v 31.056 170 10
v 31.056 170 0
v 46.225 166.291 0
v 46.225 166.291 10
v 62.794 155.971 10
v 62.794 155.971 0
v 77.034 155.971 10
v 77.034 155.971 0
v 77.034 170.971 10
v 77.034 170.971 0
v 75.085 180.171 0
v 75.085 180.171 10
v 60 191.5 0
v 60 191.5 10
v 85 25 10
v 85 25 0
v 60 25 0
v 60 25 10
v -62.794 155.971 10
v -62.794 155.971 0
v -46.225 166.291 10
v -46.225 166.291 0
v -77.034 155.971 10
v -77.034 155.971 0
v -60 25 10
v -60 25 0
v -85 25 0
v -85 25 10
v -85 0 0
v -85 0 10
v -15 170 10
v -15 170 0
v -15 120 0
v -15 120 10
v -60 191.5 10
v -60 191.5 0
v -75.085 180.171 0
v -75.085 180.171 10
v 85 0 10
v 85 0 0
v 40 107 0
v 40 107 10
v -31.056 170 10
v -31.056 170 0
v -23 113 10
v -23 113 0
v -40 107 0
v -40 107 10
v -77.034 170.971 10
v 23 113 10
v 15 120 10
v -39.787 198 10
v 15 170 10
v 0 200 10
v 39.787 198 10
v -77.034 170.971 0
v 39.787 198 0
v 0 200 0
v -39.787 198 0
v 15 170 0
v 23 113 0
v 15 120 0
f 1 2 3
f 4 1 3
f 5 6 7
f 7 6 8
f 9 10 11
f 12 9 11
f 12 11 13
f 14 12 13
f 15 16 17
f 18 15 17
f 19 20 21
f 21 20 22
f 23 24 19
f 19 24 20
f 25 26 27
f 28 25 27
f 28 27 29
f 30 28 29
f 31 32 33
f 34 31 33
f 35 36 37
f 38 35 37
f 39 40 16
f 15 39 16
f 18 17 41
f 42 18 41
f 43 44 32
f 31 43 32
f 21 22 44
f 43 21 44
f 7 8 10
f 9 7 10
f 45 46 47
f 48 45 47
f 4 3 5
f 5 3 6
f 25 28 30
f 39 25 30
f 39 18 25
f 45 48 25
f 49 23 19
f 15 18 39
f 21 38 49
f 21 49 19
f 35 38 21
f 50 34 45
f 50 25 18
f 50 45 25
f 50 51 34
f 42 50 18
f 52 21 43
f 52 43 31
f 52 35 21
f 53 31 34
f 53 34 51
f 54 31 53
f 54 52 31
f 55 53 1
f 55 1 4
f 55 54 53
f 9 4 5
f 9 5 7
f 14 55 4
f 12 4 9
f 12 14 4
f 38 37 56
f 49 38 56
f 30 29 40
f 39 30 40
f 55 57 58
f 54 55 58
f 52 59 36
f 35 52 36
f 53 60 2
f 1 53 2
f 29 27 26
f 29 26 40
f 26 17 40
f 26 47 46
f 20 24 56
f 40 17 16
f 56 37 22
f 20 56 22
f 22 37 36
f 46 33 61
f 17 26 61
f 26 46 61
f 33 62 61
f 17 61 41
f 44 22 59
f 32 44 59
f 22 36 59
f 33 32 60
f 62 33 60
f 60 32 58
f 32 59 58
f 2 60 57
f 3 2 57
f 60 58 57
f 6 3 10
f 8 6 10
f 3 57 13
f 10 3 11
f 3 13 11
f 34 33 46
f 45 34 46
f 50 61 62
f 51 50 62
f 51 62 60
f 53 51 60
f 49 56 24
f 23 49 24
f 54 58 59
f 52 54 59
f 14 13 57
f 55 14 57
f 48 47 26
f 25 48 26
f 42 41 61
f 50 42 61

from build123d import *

# Parameters (mm, degrees)
BOSS_EXTRUDE1_DEPTH = 10


with BuildPart() as part:
    # Sketch1 → Boss-Extrude1 (new body)
    with BuildSketch(Plane.XY):
        Polygon((40, 107), (23, 113), (15, 120), (15, 170), (31.055768347, 170), (46.225269869, 166.291261256), (62.793848643, 155.971389715), (77.033804463, 155.971389715), (77.033804463, 170.971389715), (75.085424996, 180.171389715), (60, 191.5), (39.787088413, 198), (0, 200), (-39.787088413, 198), (-60, 191.5), (-75.085424996, 180.171389715), (-77.033804463, 170.971389715), (-77.033804463, 155.971389715), (-62.793848643, 155.971389715), (-46.225269869, 166.291261256), (-31.055768347, 170), (-15, 170), (-15, 120), (-23, 113), (-40, 107), (-60, 25), (-85, 25), (-85, 0), (85, 0), (85, 25), (60, 25), align=None)
    extrude(amount=BOSS_EXTRUDE1_DEPTH)


solid = part.part
